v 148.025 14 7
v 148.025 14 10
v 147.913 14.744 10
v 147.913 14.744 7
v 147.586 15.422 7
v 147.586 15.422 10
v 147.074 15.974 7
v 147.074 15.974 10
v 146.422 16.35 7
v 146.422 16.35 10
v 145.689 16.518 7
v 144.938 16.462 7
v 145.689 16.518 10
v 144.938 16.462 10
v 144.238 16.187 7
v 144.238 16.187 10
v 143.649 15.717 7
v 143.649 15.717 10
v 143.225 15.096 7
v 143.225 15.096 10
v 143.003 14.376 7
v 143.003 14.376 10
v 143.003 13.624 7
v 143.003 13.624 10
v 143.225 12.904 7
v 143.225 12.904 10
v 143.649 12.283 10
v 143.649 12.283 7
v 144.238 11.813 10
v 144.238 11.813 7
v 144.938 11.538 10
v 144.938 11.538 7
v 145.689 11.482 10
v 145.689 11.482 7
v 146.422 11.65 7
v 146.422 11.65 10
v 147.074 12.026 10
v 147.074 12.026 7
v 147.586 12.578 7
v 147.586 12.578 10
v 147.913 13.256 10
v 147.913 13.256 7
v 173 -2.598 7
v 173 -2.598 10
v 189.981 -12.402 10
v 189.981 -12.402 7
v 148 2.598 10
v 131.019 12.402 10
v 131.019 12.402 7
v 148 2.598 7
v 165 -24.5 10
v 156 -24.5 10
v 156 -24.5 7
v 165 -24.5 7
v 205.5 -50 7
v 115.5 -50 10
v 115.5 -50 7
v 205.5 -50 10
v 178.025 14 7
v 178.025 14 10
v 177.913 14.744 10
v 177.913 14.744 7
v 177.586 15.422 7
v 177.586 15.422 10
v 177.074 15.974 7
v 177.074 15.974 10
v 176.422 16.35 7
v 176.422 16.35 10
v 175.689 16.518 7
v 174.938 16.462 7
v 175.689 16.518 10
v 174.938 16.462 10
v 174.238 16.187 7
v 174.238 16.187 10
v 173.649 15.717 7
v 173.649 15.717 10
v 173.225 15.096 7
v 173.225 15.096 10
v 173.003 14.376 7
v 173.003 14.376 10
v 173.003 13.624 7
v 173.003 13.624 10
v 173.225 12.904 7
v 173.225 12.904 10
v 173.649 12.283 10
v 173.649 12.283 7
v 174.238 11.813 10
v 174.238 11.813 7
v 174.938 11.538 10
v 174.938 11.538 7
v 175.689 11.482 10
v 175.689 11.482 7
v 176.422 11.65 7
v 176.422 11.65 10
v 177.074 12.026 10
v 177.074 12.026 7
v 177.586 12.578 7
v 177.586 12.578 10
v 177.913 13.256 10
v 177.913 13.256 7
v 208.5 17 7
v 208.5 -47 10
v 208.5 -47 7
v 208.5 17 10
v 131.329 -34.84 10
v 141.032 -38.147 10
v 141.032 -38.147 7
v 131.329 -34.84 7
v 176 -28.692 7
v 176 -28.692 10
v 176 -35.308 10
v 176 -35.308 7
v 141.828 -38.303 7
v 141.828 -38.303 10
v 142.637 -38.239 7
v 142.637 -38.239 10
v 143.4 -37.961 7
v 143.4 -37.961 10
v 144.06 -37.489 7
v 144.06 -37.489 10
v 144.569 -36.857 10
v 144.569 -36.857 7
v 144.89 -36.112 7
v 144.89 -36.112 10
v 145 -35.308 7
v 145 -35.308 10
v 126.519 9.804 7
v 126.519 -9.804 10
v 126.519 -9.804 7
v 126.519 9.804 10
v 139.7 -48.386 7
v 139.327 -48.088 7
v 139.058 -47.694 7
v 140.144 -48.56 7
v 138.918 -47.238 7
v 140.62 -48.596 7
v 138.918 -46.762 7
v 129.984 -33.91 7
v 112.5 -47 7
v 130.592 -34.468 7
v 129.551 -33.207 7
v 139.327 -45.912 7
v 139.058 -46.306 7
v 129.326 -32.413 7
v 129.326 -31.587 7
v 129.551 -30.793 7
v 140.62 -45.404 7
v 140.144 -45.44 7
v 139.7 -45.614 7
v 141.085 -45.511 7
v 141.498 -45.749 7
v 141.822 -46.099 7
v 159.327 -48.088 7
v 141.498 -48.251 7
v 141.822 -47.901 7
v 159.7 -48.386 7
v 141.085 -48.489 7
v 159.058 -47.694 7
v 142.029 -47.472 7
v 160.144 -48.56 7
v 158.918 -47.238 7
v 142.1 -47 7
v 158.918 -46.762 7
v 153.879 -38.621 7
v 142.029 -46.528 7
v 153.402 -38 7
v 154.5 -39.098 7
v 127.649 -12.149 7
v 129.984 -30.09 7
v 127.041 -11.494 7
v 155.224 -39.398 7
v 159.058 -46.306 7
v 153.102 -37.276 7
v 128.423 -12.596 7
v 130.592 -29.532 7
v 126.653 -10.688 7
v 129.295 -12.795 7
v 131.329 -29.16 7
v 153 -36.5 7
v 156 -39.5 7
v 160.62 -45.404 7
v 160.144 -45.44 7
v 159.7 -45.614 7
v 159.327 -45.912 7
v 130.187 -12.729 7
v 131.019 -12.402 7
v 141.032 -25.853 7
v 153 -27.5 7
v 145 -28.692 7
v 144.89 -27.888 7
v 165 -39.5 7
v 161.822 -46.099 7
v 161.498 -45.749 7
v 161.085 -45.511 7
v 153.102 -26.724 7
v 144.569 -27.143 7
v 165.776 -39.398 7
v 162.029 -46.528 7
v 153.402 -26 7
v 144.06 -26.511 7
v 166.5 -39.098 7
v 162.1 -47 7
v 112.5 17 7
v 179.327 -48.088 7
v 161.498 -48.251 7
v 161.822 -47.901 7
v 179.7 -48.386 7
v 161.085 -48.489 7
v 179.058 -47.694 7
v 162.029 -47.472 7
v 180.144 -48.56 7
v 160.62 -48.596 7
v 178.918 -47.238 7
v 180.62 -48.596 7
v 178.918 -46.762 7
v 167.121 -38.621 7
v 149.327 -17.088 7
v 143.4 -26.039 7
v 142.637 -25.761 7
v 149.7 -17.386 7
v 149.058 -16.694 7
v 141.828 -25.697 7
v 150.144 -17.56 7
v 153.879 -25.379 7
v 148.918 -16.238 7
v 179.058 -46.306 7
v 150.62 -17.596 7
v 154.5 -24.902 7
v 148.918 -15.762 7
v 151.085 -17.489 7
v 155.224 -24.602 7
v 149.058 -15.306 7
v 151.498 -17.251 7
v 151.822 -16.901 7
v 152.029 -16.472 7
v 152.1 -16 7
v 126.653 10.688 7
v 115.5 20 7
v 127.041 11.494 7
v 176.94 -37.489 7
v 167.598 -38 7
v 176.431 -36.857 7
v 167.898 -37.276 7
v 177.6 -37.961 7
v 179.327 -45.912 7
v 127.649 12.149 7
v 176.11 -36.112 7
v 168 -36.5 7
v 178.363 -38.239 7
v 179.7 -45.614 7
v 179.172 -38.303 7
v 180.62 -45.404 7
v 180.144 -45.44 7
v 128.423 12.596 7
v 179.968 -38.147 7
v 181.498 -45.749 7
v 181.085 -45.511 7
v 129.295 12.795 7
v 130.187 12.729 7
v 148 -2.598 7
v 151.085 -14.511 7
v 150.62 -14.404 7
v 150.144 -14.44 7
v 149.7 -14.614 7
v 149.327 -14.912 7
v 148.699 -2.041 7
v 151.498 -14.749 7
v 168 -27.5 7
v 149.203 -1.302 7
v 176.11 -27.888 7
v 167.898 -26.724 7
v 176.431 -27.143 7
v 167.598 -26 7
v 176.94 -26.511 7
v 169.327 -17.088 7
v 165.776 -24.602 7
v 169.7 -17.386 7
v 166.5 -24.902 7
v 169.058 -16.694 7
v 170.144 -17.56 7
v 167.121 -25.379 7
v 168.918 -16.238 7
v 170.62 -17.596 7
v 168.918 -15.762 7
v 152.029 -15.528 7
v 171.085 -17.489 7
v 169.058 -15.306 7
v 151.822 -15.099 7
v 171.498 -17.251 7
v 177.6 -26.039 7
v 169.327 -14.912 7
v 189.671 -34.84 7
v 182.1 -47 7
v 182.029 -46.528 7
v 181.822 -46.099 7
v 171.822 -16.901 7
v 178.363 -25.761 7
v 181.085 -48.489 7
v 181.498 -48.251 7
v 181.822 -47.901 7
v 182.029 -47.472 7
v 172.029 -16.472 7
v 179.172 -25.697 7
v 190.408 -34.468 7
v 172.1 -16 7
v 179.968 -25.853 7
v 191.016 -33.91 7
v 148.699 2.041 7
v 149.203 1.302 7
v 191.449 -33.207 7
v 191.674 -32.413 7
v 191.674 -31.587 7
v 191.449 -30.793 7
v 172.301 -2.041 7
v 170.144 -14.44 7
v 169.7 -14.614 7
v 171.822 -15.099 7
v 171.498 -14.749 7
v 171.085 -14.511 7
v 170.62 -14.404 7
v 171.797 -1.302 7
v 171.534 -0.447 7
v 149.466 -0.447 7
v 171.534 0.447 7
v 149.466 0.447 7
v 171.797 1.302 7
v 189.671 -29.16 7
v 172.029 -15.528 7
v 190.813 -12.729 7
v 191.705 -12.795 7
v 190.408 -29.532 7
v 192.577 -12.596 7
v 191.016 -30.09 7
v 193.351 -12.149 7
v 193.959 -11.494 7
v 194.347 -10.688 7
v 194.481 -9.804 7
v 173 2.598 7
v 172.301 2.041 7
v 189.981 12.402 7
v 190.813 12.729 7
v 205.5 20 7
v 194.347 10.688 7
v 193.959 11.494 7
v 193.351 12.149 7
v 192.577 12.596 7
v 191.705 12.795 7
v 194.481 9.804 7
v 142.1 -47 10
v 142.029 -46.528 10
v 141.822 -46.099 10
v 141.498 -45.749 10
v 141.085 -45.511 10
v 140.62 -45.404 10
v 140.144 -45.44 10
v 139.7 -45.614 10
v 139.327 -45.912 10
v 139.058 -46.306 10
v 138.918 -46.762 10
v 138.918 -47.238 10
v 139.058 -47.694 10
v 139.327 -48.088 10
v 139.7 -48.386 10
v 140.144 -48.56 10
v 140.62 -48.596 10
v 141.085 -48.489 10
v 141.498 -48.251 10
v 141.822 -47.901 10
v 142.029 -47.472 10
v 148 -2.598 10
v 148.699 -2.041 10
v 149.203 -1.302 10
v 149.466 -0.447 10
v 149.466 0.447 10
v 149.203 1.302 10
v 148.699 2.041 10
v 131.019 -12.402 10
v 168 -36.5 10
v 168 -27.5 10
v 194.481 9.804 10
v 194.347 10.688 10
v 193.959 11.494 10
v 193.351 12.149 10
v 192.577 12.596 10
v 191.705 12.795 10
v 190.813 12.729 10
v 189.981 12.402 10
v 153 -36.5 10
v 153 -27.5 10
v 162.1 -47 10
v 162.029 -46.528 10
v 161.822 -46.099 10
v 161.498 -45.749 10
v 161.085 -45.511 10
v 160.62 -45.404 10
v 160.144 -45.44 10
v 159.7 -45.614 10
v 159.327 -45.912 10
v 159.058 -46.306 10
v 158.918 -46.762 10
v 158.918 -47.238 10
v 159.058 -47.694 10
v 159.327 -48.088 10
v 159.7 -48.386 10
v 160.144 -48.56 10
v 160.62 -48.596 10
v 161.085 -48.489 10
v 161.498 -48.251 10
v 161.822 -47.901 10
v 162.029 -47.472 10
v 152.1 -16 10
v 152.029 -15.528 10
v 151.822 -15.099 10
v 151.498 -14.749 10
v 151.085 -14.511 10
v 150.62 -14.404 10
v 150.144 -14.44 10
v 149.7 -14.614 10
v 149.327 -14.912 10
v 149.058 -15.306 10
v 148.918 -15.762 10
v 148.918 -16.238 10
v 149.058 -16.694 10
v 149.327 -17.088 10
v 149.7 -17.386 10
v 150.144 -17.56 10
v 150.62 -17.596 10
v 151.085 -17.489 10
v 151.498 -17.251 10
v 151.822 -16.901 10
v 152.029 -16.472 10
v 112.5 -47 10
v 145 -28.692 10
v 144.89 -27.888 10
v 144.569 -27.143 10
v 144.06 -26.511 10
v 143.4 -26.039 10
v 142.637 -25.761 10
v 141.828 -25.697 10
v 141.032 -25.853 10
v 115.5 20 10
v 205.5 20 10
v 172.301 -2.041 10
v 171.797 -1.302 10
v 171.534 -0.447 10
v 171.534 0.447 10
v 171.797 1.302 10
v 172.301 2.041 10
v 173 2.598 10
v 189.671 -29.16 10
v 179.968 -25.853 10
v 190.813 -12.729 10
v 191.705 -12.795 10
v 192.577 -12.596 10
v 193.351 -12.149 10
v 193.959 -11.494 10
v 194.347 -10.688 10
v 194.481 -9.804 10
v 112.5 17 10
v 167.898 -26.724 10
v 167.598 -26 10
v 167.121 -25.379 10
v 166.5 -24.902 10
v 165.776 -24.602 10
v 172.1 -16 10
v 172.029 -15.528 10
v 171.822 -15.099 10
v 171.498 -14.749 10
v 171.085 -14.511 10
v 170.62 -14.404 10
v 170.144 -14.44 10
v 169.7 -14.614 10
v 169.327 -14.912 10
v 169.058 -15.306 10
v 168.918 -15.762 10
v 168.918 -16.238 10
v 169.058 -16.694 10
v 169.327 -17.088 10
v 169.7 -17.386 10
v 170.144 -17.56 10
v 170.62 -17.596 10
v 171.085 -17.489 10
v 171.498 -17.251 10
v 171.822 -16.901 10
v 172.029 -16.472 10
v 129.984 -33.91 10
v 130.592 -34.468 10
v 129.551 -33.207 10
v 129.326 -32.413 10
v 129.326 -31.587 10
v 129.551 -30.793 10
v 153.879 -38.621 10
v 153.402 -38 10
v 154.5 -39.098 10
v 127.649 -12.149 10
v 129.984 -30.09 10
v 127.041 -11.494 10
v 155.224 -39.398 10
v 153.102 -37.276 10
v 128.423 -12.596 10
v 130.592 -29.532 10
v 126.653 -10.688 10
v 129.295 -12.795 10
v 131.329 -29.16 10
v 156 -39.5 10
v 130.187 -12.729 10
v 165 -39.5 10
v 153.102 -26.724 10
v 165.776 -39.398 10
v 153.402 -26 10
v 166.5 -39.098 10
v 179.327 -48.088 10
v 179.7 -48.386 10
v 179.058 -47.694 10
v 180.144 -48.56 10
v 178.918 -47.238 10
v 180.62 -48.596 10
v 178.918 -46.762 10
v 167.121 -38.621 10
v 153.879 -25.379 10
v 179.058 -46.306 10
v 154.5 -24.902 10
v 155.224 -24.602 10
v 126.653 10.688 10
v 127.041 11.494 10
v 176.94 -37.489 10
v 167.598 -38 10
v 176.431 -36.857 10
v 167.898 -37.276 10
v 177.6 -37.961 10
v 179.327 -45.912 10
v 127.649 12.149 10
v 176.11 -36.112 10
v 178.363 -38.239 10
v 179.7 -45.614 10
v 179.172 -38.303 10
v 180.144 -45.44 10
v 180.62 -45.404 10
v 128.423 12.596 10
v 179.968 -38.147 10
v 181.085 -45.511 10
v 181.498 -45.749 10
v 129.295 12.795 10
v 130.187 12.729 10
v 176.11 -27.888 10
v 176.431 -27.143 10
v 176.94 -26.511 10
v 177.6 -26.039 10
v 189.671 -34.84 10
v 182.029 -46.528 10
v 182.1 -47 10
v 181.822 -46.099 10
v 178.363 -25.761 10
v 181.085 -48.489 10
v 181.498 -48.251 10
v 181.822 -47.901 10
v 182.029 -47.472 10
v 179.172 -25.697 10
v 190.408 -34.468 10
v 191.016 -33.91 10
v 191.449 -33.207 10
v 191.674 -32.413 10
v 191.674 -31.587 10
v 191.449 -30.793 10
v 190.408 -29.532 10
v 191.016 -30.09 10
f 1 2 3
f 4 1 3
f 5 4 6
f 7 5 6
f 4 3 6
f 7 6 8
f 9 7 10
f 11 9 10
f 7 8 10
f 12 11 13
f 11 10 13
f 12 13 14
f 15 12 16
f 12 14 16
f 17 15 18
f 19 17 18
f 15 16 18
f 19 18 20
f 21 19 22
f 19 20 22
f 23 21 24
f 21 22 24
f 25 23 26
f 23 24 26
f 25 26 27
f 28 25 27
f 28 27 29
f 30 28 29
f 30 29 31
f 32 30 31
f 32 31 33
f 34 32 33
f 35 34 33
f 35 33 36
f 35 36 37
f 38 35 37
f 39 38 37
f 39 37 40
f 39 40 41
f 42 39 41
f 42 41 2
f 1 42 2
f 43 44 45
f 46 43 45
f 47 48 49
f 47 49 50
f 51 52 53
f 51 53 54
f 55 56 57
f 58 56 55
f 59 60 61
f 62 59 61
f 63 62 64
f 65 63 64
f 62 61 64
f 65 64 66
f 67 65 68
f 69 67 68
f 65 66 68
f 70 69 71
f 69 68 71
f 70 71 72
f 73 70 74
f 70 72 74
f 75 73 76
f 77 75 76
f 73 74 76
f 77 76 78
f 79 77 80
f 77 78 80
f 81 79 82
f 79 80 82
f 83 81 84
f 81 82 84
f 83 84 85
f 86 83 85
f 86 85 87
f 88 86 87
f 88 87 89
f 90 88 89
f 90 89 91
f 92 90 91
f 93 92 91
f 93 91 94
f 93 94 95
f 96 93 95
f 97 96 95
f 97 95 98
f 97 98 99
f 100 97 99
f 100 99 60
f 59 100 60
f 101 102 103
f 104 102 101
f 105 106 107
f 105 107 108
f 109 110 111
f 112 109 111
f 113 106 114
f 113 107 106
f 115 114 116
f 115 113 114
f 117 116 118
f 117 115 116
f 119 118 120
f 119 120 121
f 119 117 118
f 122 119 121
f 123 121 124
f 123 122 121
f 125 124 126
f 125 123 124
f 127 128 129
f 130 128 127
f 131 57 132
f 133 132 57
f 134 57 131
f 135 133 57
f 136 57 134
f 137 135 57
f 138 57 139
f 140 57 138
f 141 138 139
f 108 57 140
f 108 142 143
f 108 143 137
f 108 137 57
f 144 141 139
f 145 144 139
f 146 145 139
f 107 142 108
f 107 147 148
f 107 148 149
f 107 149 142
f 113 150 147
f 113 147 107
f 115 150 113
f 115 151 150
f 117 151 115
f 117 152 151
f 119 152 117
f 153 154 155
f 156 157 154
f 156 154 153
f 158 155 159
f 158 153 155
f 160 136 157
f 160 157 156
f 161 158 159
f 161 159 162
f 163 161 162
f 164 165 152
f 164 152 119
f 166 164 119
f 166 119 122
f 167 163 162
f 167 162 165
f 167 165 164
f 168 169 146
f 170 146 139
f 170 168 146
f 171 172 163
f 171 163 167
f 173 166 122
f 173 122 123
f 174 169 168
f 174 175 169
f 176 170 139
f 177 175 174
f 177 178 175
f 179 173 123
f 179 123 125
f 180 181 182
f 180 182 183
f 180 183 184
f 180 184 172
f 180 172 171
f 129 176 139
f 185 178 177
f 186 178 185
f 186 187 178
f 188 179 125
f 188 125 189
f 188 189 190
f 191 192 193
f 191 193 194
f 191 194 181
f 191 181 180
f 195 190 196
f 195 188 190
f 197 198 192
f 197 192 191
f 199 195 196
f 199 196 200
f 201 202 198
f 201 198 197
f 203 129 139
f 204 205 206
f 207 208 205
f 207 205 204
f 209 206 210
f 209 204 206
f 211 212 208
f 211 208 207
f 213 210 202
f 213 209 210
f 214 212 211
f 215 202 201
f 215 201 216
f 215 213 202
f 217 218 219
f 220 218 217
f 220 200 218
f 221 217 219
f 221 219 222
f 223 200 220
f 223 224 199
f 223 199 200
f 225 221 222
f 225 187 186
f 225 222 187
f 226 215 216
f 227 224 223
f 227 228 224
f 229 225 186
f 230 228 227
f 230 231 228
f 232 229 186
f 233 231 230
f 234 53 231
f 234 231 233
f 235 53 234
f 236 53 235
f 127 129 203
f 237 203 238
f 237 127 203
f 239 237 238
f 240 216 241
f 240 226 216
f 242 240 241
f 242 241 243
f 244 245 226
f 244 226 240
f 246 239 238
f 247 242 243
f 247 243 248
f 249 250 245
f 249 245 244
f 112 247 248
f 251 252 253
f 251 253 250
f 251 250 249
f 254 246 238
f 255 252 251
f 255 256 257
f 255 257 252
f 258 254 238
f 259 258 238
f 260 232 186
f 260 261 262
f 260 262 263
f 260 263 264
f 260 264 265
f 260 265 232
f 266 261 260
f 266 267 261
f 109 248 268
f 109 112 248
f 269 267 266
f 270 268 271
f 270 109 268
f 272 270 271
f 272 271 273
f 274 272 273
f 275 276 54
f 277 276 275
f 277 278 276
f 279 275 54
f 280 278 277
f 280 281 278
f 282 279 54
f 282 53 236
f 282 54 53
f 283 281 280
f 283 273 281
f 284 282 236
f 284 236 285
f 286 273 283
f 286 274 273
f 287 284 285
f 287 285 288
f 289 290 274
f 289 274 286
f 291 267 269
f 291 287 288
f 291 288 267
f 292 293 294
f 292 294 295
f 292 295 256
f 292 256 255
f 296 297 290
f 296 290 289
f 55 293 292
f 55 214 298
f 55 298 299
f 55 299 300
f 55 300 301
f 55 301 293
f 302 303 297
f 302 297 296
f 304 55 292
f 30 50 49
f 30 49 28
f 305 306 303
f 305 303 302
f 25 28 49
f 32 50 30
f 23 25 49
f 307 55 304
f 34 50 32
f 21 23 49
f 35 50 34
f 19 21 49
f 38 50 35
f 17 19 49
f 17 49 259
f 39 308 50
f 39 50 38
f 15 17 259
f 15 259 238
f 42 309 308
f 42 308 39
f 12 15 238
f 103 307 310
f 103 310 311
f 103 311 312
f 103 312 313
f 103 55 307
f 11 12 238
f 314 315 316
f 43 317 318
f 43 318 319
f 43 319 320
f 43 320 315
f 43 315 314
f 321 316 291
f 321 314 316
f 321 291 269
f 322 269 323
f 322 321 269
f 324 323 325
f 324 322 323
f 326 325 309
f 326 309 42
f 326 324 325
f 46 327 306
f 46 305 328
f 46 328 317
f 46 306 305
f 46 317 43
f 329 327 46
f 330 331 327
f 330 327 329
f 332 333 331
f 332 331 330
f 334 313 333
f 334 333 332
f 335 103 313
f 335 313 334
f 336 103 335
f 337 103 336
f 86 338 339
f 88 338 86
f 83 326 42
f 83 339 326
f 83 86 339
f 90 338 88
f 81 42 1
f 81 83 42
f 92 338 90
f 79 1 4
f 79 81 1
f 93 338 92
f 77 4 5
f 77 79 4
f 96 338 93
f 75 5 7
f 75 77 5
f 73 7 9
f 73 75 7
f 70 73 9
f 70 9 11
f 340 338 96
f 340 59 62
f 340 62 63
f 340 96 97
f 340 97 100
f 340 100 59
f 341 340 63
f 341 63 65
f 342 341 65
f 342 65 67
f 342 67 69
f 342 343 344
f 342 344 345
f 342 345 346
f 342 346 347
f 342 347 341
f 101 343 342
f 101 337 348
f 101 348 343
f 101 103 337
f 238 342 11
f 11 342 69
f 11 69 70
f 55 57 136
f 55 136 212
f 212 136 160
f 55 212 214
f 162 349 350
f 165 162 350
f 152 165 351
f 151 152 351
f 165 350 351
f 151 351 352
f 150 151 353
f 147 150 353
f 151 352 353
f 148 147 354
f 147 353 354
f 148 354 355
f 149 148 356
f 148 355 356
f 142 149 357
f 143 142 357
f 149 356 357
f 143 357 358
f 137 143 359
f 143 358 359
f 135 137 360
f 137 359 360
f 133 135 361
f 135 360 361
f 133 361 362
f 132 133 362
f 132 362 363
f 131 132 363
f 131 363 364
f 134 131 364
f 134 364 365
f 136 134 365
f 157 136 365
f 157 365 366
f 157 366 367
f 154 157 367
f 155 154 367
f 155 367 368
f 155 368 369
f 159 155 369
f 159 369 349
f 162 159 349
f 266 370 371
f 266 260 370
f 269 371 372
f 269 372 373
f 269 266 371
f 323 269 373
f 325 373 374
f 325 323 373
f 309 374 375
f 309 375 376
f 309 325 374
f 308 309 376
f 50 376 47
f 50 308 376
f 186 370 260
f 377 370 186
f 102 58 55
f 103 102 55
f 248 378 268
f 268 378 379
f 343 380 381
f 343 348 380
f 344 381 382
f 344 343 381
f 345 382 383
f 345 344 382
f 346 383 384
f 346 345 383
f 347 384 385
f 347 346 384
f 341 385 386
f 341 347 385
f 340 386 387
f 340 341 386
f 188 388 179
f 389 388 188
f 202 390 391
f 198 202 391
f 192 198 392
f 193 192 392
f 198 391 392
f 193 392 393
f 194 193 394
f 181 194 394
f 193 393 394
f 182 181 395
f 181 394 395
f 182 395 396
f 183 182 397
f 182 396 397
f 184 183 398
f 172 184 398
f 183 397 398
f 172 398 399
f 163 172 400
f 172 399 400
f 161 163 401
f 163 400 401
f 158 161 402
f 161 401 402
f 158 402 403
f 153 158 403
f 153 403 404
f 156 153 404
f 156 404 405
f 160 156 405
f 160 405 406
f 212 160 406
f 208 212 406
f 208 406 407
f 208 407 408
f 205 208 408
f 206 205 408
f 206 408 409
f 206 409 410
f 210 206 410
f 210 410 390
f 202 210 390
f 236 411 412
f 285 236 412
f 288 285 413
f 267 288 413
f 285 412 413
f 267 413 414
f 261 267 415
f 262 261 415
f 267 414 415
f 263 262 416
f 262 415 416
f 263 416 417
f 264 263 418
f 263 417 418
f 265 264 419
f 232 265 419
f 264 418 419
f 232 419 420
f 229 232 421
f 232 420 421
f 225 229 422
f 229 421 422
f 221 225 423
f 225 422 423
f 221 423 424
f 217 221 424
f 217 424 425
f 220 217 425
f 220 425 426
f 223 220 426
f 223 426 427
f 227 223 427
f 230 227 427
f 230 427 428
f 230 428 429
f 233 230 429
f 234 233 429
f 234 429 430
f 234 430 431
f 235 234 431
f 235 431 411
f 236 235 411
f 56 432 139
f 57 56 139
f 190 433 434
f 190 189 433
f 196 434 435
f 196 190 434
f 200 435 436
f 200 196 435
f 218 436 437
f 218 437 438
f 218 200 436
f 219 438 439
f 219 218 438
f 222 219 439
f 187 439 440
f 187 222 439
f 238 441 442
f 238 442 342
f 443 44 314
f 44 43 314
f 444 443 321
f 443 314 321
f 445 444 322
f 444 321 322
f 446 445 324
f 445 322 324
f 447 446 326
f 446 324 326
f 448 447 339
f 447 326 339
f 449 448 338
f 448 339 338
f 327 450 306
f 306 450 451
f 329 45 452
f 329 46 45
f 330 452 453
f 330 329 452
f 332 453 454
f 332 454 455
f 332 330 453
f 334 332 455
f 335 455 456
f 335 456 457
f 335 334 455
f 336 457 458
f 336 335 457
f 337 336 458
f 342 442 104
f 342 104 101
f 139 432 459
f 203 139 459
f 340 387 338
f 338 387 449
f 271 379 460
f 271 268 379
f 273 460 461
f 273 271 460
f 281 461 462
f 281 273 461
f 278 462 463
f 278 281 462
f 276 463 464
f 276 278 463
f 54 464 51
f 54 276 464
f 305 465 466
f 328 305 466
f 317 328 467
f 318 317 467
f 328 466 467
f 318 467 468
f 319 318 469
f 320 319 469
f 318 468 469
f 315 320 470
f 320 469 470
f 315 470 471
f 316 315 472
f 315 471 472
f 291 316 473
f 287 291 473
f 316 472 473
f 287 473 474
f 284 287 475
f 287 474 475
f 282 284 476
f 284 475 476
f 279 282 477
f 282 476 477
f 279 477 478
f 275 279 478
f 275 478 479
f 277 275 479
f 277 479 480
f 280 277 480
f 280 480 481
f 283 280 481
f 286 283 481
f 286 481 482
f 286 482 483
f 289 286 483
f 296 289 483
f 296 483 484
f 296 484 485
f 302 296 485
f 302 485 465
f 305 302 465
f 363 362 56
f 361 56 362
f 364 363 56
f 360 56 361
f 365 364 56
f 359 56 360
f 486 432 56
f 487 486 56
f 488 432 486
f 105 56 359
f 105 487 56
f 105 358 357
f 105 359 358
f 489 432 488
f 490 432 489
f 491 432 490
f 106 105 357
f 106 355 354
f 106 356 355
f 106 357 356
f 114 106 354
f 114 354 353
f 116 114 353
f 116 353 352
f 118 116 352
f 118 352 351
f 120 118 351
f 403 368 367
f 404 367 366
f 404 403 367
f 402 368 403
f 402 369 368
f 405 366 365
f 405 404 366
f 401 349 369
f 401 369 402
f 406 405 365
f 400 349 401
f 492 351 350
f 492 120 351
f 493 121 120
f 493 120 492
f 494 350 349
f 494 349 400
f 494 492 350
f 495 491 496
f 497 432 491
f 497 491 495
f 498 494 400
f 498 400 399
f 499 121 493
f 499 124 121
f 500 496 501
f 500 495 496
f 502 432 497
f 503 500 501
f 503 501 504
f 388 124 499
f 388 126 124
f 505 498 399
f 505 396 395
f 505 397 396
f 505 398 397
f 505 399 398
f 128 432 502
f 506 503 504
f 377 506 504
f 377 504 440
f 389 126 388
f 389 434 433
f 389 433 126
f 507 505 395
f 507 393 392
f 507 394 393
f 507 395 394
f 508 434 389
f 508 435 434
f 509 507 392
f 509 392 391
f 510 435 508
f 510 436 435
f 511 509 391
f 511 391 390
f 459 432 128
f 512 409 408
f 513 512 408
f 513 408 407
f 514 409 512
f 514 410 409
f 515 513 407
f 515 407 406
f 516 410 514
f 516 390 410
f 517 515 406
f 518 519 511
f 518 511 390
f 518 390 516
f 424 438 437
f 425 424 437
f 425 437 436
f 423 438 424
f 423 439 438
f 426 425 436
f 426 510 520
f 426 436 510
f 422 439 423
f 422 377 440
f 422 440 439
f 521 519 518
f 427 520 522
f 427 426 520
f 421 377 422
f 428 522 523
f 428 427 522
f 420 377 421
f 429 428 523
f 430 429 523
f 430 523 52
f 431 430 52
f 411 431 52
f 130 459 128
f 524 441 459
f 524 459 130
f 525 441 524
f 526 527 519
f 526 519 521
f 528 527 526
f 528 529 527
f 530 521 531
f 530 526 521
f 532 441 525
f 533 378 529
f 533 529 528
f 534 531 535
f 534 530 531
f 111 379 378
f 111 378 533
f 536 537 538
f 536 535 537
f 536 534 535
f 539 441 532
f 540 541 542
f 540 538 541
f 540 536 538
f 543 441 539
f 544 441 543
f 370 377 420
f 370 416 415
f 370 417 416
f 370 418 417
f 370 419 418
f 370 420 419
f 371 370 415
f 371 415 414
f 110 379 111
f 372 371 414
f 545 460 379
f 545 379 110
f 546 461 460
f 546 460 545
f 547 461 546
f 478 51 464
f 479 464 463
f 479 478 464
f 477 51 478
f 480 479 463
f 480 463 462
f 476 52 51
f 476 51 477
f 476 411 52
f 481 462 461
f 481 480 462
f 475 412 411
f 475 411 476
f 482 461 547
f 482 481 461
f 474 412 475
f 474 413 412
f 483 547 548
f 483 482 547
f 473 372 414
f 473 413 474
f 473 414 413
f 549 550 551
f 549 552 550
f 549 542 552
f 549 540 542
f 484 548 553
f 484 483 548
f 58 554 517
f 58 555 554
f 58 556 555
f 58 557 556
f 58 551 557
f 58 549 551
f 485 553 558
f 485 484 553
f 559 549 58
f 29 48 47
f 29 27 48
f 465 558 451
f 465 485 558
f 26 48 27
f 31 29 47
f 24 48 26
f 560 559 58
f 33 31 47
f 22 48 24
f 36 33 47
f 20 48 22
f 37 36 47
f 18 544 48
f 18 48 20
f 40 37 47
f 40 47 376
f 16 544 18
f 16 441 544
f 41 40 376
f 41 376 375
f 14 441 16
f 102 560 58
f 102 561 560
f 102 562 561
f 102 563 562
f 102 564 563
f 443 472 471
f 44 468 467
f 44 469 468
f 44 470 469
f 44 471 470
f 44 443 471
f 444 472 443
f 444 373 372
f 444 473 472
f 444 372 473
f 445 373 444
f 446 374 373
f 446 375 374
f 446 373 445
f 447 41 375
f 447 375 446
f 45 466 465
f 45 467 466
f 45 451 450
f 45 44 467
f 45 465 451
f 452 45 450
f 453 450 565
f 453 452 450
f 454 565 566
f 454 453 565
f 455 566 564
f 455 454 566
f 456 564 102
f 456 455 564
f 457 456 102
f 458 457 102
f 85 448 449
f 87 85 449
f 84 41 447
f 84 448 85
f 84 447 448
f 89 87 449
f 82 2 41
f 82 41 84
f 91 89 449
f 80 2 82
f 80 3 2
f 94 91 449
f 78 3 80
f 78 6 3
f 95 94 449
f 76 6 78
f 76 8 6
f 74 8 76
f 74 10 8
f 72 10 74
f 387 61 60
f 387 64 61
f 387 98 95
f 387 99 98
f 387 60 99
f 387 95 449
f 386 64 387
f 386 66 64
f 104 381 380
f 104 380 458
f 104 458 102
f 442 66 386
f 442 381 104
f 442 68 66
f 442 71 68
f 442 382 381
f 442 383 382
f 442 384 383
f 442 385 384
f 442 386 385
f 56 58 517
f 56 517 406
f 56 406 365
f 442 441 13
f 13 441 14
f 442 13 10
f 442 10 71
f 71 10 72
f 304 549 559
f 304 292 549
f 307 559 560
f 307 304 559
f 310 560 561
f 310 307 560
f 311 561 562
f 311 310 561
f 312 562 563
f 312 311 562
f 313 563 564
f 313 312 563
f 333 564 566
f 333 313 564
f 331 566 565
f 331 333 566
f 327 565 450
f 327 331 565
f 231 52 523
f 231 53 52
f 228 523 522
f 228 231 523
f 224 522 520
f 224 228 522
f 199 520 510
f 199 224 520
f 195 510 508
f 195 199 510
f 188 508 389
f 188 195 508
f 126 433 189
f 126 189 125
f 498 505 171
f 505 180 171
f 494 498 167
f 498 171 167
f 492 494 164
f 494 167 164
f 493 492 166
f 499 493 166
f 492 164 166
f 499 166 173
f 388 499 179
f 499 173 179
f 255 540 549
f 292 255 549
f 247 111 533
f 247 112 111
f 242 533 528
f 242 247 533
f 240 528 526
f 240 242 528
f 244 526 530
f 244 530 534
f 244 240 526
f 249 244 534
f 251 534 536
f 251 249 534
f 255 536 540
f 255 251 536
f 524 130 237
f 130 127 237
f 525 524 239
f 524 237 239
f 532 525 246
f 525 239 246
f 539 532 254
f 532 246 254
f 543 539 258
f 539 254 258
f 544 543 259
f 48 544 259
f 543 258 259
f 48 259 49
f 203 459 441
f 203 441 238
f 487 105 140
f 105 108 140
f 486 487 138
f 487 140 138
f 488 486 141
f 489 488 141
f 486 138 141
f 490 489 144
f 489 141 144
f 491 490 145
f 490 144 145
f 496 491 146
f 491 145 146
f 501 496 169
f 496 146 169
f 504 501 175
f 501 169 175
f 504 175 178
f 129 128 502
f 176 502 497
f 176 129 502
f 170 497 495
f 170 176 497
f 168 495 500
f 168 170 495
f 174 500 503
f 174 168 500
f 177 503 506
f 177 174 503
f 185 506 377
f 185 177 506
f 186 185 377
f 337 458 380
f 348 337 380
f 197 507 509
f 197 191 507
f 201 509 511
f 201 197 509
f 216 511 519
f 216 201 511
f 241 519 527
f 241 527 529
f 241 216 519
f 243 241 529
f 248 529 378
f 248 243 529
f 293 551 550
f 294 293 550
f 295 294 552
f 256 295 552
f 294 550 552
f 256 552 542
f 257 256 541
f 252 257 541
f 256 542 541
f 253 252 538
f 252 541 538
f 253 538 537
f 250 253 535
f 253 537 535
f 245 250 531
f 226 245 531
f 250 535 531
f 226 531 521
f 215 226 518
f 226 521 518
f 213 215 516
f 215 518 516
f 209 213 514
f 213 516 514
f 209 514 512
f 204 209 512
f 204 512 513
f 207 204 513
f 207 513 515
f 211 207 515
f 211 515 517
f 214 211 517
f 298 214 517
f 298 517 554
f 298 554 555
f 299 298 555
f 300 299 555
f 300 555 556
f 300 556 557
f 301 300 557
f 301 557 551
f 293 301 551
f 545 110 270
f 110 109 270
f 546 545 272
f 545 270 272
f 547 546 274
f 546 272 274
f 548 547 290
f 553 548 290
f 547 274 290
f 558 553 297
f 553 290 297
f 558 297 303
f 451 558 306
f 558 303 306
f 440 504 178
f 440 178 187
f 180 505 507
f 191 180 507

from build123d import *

# Parameters (mm, degrees)
SKETCH_1_W           = 20
SKETCH_1_H           = 40
SKETCH_1_W_2         = 14
SKETCH_1_H_2         = 34
EXTRUDE_1_DEPTH      = 321
SKETCH_15_R          = 2.525
CUT_EXTRUDE_12_DEPTH = 21
SKETCH_18_W          = 17
SKETCH_18_H          = 40
CUT_EXTRUDE_14_DEPTH = 322
SKETCH_19_W          = 96
SKETCH_19_H          = 30
EXTRUDE_2_DEPTH      = 3
SKETCH_17_R          = 1.6
CUT_EXTRUDE_13_DEPTH = 4
FILLET_1_R           = 2
CHAMFER_1_SIZE       = 3
SKETCH_20_W          = 11
SKETCH_20_H          = 22.5
SKETCH_20_W_2        = 15
SKETCH_20_H_2        = 15
CUT_EXTRUDE_15_DEPTH = 4
FILLET_2_R           = 3
CUT_EXTRUDE_16_DEPTH = 4
FILLET_3_R           = 2
SKETCH_22_R          = 1.6
CUT_EXTRUDE_17_DEPTH = 4
CUT_EXTRUDE_19_DEPTH = 10
CHAMFER_2_SIZE       = 3
EXTRUDE_3_DEPTH      = 3
CUT_EXTRUDE_20_DEPTH = 4
FILLET_4_R           = 3


with BuildPart() as part:
    # 草图1 → 凸台-拉伸1 (new body)
    with BuildSketch(Plane(origin=(0, 0, 0), x_dir=(0, 0, -1), z_dir=(1, 0, 0))):
        Rectangle(SKETCH_1_W, SKETCH_1_H)
        Rectangle(SKETCH_1_W_2, SKETCH_1_H_2, mode=Mode.SUBTRACT)
    extrude(amount=EXTRUDE_1_DEPTH)

    # 草图15 → 切除-拉伸12 (cut, through all)
    with BuildSketch(Plane.XY.offset(10)):
        with Locations((145.5, 14)):
            Circle(SKETCH_15_R)
        with Locations((175.5, 14)):
            Circle(SKETCH_15_R)
    extrude(amount=-CUT_EXTRUDE_12_DEPTH, mode=Mode.SUBTRACT)

    # 草图18 → 切除-拉伸14 (cut, through all)
    with BuildSketch(Plane(origin=(321, 0, 0), x_dir=(0, 0, -1), z_dir=(1, 0, 0))):
        with Locations((1.5, 0)):
            Rectangle(SKETCH_18_W, SKETCH_18_H)
    extrude(amount=-CUT_EXTRUDE_14_DEPTH, mode=Mode.SUBTRACT)

    # 草图19 → 凸台-拉伸2 (add)
    with BuildSketch(Plane.XY.offset(10)):
        with Locations((160.5, -35)):
            Rectangle(SKETCH_19_W, SKETCH_19_H)
    extrude(amount=-EXTRUDE_2_DEPTH)

    # 草图17 → 切除-拉伸13 (cut, through all)
    with BuildSketch(Plane.XY.offset(10)):
        with Locations((12, 16.5)):
            Circle(SKETCH_17_R)
        with Locations((29, 16.5)):
            Circle(SKETCH_17_R)
        with Locations((12, -14)):
            Circle(SKETCH_17_R)
        with Locations((29, -14)):
            Circle(SKETCH_17_R)
        with Locations((43.5, -14)):
            Circle(SKETCH_17_R)
        with Locations((67.5, -14)):
            Circle(SKETCH_17_R)
        with Locations((222, -14)):
            Circle(SKETCH_17_R)
        with Locations((239, -14)):
            Circle(SKETCH_17_R)
        with Locations((253.5, -14)):
            Circle(SKETCH_17_R)
        with Locations((277.5, -14)):
            Circle(SKETCH_17_R)
        with Locations((292, -14)):
            Circle(SKETCH_17_R)
        with Locations((309, -14)):
            Circle(SKETCH_17_R)
        with Locations((82, -14)):
            Circle(SKETCH_17_R)
        with Locations((99, -14)):
            Circle(SKETCH_17_R)
        with Locations((292, 16.5)):
            Circle(SKETCH_17_R)
        with Locations((309, 16.5)):
            Circle(SKETCH_17_R)
        with Locations((140.5, -47)):
            Circle(SKETCH_17_R)
        with Locations((160.5, -47)):
            Circle(SKETCH_17_R)
        with Locations((180.5, -47)):
            Circle(SKETCH_17_R)
    extrude(amount=-CUT_EXTRUDE_13_DEPTH, mode=Mode.SUBTRACT)

    # 圆角1
    fillet_1_edges = [part.edges().sort_by_distance(p)[0] for p in [
        (208.5, -20, 8.5),
        (112.5, -20, 8.5),
    ]]
    fillet(fillet_1_edges, radius=FILLET_1_R)

    # 倒角1
    chamfer_1_edges = [part.edges().sort_by_distance(p)[0] for p in [
        (0, 20, 8.5),
        (321, 20, 8.5),
        (0, -20, 8.5),
        (208.5, -50, 8.5),
        (112.5, -50, 8.5),
        (321, -20, 8.5),
    ]]
    chamfer(chamfer_1_edges, length=CHAMFER_1_SIZE)

    # 草图20 → 切除-拉伸15 (cut, through all)
    with BuildSketch(Plane.XY.offset(10)):
        with Locations((300.5, 1.25)):
            Rectangle(SKETCH_20_W, SKETCH_20_H)
        with Locations((20.5, 1.25)):
            Rectangle(SKETCH_20_W, SKETCH_20_H)
        with Locations((160.5, -32)):
            Rectangle(SKETCH_20_W_2, SKETCH_20_H_2)
        Polygon((123, -32), (145, -24.5), (145, -39.5), align=None)
        Polygon((176, -24.5), (176, -39.5), (198, -32), align=None)
    extrude(amount=-CUT_EXTRUDE_15_DEPTH, mode=Mode.SUBTRACT)

    # 圆角2
    fillet_2_edges = [part.edges().sort_by_distance(p)[0] for p in [
        (26, 12.5, 8.5),
        (26, -10, 8.5),
        (15, -10, 8.5),
        (15, 12.5, 8.5),
        (176, -24.5, 8.5),
        (198, -32, 8.5),
        (176, -39.5, 8.5),
        (145, -39.5, 8.5),
        (123, -32, 8.5),
        (145, -24.5, 8.5),
        (168, -24.5, 8.5),
        (168, -39.5, 8.5),
        (153, -39.5, 8.5),
        (153, -24.5, 8.5),
        (306, 12.5, 8.5),
        (306, -10, 8.5),
        (295, -10, 8.5),
        (295, 12.5, 8.5),
    ]]
    fillet(fillet_2_edges, radius=FILLET_2_R)

    # 草图21 → 切除-拉伸16 (cut, through all)
    with BuildSketch(Plane.XY.offset(10)):
        Polygon((33, 6.144919815), (33, -10), (55.199264746, -10), align=None)
        Polygon((181.103828979, -10), (139.896171021, -10), (160.5, 8.609910045), align=None)
        Polygon((67.248892355, -8.871386982), (41.300735254, 10), (88.479202711, 10), align=None)
        Polygon((288, -10), (265.800735254, -10), (288, 6.144919815), align=None)
        Polygon((253.751107645, -8.871386982), (232.520797289, 10), (279.699264746, 10), align=None)
    extrude(amount=-CUT_EXTRUDE_16_DEPTH, mode=Mode.SUBTRACT)

    # 圆角3
    fillet_3_edges = [part.edges().sort_by_distance(p)[0] for p in [
        (279.699264746, 10, 8.5),
        (253.751107645, -8.871386982, 8.5),
        (232.520797289, 10, 8.5),
        (265.800735254, -10, 8.5),
        (288, 6.144919815, 8.5),
        (288, -10, 8.5),
        (160.5, 8.609910045, 8.5),
        (181.103828979, -10, 8.5),
        (139.896171021, -10, 8.5),
        (88.479202711, 10, 8.5),
        (67.248892355, -8.871386982, 8.5),
        (41.300735254, 10, 8.5),
        (33, 6.144919815, 8.5),
        (55.199264746, -10, 8.5),
        (33, -10, 8.5),
    ]]
    fillet(fillet_3_edges, radius=FILLET_3_R)

    # 草图22 → 切除-拉伸17 (cut, through all)
    with BuildSketch(Plane.XY.offset(10)):
        with Locations((150.5, -16)):
            Circle(SKETCH_22_R)
        with Locations((170.5, -16)):
            Circle(SKETCH_22_R)
    extrude(amount=-CUT_EXTRUDE_17_DEPTH, mode=Mode.SUBTRACT)

    # 草图26 → 切除-拉伸19 (cut)
    with BuildSketch(Plane.XY.offset(10)):
        with BuildLine():
            ThreePointArc((110.5, -20), (111.914213562, -20.585786438), (112.5, -22))
            Line((112.5, -22), (112.5, 20))
            Line((112.5, 20), (3, 20))
            Line((3, 20), (0, 17))
            Line((0, 17), (0, -17))
            Line((0, -17), (3, -20))
            Line((3, -20), (110.5, -20))
        make_face()
        with BuildLine():
            ThreePointArc((210.5, -20), (209.085786438, -20.585786438), (208.5, -22))
            Line((208.5, -22), (208.5, 20))
            Line((208.5, 20), (318, 20))
            Line((318, 20), (321, 17))
            Line((321, 17), (321, -17))
            Line((321, -17), (318, -20))
            Line((318, -20), (210.5, -20))
        make_face()
    extrude(amount=-CUT_EXTRUDE_19_DEPTH, mode=Mode.SUBTRACT)

    # 倒角2
    chamfer_2_edges = [part.edges().sort_by_distance(p)[0] for p in [
        (112.5, 20, 8.5),
        (208.5, 20, 8.5),
    ]]
    chamfer(chamfer_2_edges, length=CHAMFER_2_SIZE)

    # 草图27 → 凸台-拉伸3 (add)
    with BuildSketch(Plane.XY.offset(10)):
        with BuildLine():
            Line((145.094256532, -10), (175.905743468, -10))
            ThreePointArc((175.905743468, -10), (177.772346073, -8.718188495), (177.246315984, -6.515794714))
            Line((177.246315984, -6.515794714), (161.840572516, 7.399070354))
            ThreePointArc((161.840572516, 7.399070354), (160.5, 7.914865068), (159.159427484, 7.399070354))
            Line((159.159427484, 7.399070354), (143.753684016, -6.515794714))
            ThreePointArc((143.753684016, -6.515794714), (143.227653927, -8.718188495), (145.094256532, -10))
        make_face()
    extrude(amount=-EXTRUDE_3_DEPTH)

    # 草图28 → 切除-拉伸20 (cut, through all)
    with BuildSketch(Plane.XY.offset(10)):
        Polygon((126.519237886, 15), (152.5, 0), (126.519237886, -15), align=None)
        Polygon((168.5, 0), (194.480762114, -15), (194.480762114, 15), align=None)
    extrude(amount=-CUT_EXTRUDE_20_DEPTH, mode=Mode.SUBTRACT)

    # 圆角4
    fillet_4_edges = [part.edges().sort_by_distance(p)[0] for p in [
        (126.519237886, -15, 8.5),
        (126.519237886, 15, 8.5),
        (152.5, 0, 8.5),
        (168.5, 0, 8.5),
        (194.480762114, 15, 8.5),
        (194.480762114, -15, 8.5),
    ]]
    fillet(fillet_4_edges, radius=FILLET_4_R)


solid = part.part
